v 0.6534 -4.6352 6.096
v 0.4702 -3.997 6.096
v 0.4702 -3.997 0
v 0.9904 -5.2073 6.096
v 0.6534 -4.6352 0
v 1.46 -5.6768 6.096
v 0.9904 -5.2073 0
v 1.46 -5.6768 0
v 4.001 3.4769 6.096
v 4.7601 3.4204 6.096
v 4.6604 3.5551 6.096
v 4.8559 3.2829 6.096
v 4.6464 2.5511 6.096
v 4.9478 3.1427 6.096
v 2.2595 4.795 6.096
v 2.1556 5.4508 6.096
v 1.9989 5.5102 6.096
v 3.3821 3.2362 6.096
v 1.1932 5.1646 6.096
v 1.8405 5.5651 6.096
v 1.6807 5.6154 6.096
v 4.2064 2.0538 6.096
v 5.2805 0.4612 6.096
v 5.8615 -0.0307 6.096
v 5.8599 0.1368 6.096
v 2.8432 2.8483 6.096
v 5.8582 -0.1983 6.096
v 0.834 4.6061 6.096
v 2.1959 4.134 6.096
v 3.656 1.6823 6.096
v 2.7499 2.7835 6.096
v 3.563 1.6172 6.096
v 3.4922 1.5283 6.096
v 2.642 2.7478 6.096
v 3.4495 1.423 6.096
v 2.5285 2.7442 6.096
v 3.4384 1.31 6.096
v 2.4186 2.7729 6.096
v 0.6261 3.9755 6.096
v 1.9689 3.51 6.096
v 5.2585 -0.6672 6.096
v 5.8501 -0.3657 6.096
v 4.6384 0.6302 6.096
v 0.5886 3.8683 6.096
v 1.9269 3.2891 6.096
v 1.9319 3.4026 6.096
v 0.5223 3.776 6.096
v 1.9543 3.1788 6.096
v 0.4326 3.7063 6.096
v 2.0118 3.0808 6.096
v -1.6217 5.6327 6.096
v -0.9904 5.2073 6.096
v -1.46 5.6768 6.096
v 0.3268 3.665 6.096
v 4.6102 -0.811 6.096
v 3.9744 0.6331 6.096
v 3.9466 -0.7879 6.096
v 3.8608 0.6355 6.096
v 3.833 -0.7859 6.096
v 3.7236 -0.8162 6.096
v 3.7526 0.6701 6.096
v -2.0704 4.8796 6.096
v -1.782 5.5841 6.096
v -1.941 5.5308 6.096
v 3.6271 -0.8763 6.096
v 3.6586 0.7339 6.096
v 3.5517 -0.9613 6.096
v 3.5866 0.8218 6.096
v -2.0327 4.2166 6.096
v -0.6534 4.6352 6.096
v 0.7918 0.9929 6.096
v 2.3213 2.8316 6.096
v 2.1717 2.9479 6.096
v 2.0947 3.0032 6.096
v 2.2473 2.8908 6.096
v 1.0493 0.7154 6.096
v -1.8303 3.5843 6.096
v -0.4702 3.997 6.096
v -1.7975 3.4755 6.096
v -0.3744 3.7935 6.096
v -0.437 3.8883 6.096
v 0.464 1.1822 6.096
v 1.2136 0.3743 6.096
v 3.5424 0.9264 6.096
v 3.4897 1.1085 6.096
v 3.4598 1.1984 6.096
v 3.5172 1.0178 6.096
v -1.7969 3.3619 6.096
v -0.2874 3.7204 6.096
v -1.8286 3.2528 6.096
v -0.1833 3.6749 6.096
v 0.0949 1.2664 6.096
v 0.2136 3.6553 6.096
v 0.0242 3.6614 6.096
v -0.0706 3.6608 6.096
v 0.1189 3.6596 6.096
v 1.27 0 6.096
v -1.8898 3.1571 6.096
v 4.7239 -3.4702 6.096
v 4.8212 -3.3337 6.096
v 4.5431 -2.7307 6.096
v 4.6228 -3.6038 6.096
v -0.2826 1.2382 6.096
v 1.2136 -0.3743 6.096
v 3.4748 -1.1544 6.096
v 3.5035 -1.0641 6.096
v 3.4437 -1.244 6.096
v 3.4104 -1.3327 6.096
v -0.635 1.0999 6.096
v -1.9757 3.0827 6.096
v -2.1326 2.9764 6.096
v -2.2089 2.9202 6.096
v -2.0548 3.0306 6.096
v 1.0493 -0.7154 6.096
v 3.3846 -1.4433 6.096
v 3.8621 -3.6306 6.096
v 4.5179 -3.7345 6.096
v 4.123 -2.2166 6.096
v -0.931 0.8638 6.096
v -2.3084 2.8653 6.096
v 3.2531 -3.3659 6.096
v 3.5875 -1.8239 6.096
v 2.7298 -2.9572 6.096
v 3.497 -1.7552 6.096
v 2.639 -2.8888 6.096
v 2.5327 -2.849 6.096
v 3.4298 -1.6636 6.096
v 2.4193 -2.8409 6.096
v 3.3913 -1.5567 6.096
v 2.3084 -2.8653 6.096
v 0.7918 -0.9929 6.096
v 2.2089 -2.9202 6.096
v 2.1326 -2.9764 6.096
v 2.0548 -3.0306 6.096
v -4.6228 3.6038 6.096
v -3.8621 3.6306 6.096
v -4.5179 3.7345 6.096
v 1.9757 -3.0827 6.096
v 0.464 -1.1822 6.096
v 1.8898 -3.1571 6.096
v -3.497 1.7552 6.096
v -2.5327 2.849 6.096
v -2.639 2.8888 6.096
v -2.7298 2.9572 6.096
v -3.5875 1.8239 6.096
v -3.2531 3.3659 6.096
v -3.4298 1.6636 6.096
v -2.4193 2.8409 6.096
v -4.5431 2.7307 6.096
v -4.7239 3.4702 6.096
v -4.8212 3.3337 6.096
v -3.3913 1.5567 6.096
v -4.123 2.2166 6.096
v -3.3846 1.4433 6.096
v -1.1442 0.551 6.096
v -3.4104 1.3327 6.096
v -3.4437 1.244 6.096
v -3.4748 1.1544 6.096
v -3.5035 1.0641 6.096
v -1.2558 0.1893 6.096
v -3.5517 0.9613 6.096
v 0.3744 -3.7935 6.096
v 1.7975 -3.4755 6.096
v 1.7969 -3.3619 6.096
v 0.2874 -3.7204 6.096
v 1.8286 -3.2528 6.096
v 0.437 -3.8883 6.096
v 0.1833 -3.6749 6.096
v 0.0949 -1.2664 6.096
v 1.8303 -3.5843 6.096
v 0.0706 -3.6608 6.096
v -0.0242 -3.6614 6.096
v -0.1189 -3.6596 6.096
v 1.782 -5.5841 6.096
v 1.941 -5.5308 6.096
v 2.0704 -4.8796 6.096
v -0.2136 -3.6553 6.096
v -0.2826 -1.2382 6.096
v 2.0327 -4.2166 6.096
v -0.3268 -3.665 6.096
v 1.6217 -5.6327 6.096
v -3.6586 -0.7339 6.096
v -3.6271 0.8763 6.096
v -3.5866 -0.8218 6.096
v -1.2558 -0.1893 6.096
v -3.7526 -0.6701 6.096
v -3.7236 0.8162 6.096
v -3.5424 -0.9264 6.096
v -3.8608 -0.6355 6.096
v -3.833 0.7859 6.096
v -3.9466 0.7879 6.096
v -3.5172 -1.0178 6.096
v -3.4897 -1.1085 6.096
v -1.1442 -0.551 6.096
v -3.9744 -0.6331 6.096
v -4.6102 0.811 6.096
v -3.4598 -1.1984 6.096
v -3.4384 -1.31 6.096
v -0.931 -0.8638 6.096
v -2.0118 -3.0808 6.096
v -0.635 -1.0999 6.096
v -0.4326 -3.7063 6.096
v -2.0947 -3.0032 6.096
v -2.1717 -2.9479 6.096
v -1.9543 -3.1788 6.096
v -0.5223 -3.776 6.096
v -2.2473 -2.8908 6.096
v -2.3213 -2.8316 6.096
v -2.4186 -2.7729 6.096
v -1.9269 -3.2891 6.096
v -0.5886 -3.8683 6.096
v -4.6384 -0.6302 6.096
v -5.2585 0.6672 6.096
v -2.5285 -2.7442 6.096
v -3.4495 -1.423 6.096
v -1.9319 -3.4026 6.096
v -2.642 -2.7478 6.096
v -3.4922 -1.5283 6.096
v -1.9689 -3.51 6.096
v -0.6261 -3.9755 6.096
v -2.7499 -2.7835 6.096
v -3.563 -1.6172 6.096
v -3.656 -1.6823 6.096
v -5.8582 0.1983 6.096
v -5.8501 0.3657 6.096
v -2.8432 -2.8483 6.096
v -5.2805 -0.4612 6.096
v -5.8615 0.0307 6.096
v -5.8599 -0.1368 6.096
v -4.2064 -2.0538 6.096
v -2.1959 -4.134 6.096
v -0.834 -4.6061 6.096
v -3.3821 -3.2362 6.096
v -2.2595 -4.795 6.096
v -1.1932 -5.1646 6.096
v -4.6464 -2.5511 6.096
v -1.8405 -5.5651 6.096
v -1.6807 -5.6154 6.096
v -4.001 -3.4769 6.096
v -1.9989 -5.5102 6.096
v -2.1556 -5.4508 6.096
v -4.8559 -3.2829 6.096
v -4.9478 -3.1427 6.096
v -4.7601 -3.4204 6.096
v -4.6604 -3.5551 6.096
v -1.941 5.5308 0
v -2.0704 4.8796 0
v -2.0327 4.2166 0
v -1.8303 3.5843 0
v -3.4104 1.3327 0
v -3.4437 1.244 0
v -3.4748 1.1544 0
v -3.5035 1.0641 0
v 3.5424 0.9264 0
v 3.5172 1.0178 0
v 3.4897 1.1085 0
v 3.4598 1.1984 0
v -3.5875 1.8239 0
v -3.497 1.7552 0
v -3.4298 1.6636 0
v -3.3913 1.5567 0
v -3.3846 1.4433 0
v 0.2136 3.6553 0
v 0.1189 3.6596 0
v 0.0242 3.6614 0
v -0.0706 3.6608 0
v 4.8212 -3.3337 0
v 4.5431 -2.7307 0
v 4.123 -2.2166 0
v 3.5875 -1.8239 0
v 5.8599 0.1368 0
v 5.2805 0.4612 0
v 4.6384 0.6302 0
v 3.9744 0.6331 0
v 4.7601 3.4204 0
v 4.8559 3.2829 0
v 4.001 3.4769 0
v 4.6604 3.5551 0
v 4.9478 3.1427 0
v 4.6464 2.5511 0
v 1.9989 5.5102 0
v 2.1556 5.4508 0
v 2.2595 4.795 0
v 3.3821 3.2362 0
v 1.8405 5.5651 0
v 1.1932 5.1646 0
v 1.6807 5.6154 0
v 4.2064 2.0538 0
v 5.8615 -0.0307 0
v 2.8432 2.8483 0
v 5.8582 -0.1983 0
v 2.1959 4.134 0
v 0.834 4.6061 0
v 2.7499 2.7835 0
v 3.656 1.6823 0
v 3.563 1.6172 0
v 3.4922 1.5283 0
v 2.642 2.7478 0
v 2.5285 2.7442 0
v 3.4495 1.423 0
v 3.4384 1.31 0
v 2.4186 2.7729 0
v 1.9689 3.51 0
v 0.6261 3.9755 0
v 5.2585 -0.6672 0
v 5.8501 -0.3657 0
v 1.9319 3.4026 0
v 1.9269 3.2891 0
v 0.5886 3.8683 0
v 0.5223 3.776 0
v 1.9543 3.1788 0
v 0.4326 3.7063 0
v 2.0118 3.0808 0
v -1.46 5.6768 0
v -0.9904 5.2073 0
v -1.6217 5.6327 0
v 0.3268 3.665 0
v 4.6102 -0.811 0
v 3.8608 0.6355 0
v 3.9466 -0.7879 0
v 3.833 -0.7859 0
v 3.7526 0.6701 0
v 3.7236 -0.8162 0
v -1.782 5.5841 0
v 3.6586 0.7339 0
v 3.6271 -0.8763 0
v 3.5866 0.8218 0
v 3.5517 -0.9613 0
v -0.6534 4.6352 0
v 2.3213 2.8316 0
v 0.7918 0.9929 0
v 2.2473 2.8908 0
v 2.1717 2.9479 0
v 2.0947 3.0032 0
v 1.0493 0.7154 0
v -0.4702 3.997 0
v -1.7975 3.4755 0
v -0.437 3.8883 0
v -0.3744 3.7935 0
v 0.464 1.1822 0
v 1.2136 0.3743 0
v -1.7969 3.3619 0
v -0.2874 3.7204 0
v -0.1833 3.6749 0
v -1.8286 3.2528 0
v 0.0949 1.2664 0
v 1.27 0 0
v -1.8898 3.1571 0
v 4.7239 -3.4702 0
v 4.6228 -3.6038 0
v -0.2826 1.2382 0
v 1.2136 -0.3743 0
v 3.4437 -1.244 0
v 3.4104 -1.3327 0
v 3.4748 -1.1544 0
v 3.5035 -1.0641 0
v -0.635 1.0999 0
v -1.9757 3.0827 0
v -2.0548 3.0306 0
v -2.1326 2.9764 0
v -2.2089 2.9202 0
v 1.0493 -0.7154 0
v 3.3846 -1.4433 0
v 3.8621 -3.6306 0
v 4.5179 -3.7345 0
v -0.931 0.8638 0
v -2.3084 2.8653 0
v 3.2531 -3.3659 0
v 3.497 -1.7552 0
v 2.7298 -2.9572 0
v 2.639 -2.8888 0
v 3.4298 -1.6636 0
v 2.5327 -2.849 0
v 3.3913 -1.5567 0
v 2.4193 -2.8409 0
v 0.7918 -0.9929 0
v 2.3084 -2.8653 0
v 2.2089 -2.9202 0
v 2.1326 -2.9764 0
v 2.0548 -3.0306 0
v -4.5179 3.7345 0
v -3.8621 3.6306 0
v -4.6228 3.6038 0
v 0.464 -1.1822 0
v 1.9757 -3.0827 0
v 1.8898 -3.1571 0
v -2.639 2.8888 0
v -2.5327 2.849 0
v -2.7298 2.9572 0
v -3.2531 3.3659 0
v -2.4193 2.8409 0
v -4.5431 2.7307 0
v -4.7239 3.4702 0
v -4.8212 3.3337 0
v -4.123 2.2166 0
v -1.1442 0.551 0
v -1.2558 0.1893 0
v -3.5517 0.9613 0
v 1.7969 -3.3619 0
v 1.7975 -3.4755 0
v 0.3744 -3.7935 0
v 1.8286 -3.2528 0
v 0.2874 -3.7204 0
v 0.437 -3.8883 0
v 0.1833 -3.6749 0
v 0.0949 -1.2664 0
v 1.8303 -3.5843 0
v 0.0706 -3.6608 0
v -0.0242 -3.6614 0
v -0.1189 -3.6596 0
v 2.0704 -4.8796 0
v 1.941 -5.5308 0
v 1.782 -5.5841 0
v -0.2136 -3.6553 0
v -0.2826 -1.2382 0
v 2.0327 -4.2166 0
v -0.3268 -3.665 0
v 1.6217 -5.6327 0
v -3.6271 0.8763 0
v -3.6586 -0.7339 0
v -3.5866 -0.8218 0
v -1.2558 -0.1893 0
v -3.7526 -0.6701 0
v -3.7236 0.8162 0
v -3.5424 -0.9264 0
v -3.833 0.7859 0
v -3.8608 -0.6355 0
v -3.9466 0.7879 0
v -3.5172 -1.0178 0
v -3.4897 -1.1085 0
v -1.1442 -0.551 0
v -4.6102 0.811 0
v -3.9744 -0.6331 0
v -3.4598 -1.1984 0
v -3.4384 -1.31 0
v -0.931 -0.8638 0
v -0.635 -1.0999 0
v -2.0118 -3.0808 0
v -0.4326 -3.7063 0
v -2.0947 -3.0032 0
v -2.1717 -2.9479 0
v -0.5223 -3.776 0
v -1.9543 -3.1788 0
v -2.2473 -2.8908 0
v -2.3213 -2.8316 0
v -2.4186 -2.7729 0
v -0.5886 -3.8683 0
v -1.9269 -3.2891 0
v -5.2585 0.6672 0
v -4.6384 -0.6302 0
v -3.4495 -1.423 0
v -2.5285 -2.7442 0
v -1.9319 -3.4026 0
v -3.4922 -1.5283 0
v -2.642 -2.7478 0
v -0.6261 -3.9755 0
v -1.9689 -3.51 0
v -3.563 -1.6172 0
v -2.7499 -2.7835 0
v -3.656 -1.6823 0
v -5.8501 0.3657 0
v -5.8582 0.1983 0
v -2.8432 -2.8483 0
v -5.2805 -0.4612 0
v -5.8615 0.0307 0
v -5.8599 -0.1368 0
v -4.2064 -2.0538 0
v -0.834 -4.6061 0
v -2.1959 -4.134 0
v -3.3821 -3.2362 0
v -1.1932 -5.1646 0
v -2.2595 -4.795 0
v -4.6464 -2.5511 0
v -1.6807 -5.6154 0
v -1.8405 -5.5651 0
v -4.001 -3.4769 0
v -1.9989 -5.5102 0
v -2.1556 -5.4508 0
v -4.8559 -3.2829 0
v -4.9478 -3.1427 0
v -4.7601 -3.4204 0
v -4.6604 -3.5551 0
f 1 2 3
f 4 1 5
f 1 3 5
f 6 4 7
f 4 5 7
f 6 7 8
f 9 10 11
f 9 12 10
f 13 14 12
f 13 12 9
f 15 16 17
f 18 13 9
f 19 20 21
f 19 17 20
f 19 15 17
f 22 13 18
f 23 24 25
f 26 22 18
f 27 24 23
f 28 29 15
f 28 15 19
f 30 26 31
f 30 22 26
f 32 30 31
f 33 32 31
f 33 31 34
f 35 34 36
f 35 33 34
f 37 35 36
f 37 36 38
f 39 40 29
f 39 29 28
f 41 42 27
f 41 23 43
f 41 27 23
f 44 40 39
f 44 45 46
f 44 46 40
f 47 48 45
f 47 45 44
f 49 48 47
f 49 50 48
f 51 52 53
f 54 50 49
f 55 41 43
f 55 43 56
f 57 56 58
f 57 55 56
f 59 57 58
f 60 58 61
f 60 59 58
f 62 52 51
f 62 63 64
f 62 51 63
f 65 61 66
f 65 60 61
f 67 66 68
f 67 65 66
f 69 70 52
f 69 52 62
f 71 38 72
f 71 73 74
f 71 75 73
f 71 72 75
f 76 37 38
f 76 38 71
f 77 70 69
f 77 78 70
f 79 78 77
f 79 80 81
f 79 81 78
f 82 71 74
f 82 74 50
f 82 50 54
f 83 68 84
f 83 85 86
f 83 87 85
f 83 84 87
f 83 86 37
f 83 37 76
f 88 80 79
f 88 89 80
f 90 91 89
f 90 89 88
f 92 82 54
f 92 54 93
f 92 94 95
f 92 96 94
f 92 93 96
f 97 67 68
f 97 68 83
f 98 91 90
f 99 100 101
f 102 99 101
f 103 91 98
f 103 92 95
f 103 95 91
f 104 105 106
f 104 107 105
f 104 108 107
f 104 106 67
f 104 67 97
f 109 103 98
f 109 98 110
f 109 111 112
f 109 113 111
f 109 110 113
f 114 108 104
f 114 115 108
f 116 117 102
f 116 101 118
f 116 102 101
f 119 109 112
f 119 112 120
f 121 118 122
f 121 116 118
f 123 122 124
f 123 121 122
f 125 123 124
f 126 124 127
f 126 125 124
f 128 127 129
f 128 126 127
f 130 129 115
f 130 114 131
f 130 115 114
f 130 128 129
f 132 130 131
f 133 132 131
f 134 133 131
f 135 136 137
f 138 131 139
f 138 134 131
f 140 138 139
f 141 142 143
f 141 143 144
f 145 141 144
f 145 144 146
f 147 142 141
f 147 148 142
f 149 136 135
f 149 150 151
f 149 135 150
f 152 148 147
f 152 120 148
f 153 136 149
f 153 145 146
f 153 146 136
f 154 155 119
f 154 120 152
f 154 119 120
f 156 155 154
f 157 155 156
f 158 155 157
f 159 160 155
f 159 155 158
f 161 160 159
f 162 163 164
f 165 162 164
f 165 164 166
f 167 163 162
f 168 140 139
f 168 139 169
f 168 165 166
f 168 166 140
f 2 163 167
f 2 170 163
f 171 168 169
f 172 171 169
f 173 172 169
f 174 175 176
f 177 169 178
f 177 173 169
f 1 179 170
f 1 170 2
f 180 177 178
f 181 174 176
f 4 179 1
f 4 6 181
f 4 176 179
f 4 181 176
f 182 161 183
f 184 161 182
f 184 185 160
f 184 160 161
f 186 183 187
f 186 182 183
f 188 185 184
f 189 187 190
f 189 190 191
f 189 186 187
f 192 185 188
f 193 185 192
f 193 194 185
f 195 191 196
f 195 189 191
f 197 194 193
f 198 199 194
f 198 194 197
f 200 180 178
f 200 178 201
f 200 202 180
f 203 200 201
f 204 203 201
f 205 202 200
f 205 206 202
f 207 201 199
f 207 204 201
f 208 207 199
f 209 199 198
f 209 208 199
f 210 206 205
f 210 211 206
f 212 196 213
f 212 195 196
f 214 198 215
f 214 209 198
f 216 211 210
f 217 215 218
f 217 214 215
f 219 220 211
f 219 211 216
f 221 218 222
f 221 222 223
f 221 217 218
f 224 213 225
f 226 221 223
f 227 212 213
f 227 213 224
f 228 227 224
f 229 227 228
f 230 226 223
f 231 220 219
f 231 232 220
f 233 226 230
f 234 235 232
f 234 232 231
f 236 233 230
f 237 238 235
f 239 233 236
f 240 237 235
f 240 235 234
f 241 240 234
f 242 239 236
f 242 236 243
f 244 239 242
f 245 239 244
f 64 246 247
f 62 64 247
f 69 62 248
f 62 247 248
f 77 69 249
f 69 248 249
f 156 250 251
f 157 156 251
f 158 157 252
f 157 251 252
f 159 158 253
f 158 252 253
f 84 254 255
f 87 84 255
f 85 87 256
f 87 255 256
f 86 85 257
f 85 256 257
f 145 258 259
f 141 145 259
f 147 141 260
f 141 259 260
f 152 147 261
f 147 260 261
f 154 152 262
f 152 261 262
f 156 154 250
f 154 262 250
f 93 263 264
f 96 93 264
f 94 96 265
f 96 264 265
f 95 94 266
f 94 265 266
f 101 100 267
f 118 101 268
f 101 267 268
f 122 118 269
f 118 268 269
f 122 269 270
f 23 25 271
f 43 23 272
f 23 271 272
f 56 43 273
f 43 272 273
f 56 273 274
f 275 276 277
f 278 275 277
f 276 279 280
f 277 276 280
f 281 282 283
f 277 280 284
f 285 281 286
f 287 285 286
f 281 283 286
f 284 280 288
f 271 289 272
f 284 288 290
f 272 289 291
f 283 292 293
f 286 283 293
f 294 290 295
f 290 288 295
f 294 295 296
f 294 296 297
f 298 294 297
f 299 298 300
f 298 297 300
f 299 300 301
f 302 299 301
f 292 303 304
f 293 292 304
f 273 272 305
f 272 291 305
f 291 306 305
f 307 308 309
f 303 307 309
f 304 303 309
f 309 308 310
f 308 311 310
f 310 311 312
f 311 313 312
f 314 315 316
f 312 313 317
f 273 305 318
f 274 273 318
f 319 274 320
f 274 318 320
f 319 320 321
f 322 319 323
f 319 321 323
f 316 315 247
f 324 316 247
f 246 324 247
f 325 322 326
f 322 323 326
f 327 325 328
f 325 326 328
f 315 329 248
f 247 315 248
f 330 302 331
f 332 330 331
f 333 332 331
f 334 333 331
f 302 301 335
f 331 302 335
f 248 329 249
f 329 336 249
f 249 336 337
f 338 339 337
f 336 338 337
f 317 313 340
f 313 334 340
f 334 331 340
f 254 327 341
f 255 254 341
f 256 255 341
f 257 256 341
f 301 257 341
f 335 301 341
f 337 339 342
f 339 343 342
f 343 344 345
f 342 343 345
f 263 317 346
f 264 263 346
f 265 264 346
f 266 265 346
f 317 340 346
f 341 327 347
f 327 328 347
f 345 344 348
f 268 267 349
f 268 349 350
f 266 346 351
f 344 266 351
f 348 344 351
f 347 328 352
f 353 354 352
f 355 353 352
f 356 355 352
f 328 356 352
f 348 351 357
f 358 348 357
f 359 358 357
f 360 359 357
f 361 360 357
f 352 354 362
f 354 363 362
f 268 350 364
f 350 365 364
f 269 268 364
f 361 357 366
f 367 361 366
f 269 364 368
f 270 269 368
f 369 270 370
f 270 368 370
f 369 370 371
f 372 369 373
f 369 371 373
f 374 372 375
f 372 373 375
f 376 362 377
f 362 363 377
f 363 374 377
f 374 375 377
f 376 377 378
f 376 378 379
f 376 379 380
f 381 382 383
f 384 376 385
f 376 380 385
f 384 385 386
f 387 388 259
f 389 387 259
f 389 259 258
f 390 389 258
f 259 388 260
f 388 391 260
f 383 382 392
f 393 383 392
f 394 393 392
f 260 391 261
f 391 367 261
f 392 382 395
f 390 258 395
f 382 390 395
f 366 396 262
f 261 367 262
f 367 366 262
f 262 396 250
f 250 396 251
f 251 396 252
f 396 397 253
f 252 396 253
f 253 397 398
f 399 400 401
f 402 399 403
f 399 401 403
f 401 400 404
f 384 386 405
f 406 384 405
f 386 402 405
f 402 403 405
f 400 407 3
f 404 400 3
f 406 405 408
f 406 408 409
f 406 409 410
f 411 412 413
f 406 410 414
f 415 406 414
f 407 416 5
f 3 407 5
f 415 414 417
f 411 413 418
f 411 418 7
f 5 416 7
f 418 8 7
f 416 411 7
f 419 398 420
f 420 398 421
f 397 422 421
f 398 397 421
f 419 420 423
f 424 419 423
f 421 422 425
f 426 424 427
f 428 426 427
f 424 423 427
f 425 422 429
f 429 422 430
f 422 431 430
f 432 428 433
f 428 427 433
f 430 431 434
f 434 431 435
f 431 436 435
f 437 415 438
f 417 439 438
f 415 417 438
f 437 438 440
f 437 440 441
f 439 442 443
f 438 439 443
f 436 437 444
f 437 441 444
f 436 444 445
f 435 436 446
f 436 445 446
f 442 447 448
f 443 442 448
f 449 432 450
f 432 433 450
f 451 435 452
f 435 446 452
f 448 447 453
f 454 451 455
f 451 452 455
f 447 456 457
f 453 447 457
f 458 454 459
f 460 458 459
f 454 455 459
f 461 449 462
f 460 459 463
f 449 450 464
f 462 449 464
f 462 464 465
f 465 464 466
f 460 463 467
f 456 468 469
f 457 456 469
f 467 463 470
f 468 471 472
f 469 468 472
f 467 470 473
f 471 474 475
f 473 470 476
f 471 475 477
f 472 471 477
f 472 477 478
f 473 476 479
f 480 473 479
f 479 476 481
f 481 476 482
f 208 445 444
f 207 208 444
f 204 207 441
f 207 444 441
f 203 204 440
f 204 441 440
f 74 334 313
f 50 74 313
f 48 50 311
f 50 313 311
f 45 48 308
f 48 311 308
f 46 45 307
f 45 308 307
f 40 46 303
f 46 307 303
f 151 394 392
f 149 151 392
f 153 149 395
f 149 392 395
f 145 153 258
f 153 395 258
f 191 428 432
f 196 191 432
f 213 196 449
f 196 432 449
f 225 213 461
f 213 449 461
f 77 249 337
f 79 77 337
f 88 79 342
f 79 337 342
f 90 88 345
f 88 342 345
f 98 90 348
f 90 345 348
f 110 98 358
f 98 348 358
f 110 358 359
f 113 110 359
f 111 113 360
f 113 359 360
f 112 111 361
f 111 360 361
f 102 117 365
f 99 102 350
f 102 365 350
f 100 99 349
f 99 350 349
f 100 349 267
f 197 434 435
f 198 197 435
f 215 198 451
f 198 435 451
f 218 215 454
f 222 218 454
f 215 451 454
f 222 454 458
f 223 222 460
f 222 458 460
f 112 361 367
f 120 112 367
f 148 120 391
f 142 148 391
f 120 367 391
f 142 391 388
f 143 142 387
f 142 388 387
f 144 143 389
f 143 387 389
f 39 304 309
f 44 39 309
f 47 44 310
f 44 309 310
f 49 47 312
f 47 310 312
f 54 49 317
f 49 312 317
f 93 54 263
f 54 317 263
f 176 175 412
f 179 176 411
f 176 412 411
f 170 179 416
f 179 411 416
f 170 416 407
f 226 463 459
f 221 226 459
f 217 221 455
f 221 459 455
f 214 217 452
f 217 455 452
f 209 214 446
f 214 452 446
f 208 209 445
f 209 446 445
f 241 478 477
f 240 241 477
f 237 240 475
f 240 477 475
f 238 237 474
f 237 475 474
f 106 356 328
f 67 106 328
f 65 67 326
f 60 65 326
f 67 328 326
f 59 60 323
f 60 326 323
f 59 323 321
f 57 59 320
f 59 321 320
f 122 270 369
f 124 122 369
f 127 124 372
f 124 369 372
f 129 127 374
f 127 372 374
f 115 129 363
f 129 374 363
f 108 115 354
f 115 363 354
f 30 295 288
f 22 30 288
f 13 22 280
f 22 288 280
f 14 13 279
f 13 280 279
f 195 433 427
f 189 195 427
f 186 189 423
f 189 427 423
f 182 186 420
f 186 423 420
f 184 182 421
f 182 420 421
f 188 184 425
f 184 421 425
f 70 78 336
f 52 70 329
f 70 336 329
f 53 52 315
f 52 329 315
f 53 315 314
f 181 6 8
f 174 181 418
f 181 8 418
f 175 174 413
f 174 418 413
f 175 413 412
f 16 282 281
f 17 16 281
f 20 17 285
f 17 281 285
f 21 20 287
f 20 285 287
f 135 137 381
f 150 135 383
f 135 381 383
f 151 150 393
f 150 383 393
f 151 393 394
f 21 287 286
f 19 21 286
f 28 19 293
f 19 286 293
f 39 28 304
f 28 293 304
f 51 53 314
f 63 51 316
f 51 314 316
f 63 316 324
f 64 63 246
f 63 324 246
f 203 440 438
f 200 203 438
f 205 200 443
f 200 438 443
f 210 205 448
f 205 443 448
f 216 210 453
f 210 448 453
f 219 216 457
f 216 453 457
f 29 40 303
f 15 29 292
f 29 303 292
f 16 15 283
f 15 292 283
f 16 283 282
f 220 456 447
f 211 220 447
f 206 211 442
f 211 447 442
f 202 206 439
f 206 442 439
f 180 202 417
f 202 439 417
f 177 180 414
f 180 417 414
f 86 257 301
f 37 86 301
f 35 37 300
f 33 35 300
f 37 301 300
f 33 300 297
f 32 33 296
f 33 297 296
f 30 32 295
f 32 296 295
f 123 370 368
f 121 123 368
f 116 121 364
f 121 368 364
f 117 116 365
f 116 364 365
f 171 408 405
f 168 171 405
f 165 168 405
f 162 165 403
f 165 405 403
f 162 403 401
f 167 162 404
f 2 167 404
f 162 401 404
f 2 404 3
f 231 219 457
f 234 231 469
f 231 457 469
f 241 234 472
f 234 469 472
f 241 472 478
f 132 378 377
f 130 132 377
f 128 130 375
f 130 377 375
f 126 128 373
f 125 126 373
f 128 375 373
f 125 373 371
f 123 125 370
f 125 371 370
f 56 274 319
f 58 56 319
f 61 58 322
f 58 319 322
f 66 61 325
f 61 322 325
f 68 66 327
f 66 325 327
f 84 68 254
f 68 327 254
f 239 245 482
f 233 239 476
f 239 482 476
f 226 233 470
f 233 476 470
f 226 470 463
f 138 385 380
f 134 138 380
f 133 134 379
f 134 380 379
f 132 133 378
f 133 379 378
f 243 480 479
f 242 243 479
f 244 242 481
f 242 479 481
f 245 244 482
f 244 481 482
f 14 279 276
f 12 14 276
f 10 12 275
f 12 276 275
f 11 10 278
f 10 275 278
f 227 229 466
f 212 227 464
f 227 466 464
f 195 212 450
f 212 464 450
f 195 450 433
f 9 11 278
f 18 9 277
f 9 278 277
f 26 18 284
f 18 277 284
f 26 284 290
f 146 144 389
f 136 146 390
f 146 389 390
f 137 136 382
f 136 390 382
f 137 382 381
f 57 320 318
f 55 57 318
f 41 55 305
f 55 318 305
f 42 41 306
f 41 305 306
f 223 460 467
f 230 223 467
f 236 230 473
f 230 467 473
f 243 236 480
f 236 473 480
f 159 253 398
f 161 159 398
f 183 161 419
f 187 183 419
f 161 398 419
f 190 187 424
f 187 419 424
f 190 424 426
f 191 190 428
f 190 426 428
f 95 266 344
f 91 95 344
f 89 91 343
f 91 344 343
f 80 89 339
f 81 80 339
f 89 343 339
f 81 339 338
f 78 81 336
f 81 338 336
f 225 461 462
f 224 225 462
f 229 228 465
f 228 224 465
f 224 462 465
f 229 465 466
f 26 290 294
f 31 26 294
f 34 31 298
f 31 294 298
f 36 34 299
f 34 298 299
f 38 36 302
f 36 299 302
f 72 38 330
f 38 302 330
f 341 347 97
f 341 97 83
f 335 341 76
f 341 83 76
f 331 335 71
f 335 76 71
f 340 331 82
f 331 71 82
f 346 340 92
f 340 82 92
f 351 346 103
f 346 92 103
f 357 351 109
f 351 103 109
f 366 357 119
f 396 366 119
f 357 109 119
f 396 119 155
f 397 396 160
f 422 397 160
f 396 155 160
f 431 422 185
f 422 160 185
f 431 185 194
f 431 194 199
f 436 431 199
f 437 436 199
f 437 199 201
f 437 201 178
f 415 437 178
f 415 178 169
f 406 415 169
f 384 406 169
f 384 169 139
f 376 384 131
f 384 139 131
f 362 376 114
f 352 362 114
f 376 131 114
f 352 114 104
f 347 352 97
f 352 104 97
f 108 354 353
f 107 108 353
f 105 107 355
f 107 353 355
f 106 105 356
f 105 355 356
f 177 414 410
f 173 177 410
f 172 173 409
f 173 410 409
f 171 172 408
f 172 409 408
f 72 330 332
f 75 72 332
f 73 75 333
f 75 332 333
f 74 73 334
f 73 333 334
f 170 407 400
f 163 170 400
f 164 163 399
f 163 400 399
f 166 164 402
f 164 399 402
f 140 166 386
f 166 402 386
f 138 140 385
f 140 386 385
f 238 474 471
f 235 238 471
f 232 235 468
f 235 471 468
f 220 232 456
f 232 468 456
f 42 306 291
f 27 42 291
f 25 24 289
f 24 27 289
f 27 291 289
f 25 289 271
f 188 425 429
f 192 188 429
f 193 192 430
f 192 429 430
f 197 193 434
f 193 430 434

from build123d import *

# Parameters (mm, degrees)
SKETCH3_R         = 5.861538462
GEARBODY_DEPTH    = 6.096
TOOTHCUT_DEPTH    = 11.289629841
CIRPATTERN1_COUNT = 10
BOREDIA_R         = 1.27
BORE_DEPTH        = 12700


with BuildPart() as part:
    # Sketch3 → gearBody (new body)
    with BuildSketch(Plane.XY):
        Circle(SKETCH3_R)
    extrude(amount=GEARBODY_DEPTH)

    # Sketch2 → toothCut (cut, through all)
    with BuildSketch(Plane.XY):
        with BuildLine():
            ThreePointArc((3.410371072, -1.3326694), (3.459525577, -1.199300364), (3.503466664, -1.064124012))
            ThreePointArc((3.503466664, -1.064124012), (3.673182044, -0.842791414), (3.946639633, -0.787906299))
            ThreePointArc((3.946639633, -0.787906299), (5.609569592, -0.511317374), (6.763505117, 0.717613171))
            ThreePointArc((6.763505117, 0.717613171), (6.426274445, -2.22777173), (4.868104082, -4.749898186))
            ThreePointArc((4.868104082, -4.749898186), (4.722411681, -3.07043065), (3.587488494, -1.823920787))
            ThreePointArc((3.587488494, -1.823920787), (3.406677364, -1.61155609), (3.410371072, -1.3326694))
        make_face()
    toothcut = extrude(amount=TOOTHCUT_DEPTH, mode=Mode.SUBTRACT)

    # CirPattern1: toothCut ×10 about axis
    cirpattern1_axis = Axis((0, 0, 6.096), (0, 0, -1))
    for i in range(1, CIRPATTERN1_COUNT):
        add(toothcut.rotate(cirpattern1_axis, i * 360 / CIRPATTERN1_COUNT), mode=Mode.SUBTRACT)

    # boreDia → bore (cut, symmetric)
    with BuildSketch(Plane.XY):
        Circle(BOREDIA_R)
    extrude(amount=BORE_DEPTH, both=True, mode=Mode.SUBTRACT)


solid = part.part
